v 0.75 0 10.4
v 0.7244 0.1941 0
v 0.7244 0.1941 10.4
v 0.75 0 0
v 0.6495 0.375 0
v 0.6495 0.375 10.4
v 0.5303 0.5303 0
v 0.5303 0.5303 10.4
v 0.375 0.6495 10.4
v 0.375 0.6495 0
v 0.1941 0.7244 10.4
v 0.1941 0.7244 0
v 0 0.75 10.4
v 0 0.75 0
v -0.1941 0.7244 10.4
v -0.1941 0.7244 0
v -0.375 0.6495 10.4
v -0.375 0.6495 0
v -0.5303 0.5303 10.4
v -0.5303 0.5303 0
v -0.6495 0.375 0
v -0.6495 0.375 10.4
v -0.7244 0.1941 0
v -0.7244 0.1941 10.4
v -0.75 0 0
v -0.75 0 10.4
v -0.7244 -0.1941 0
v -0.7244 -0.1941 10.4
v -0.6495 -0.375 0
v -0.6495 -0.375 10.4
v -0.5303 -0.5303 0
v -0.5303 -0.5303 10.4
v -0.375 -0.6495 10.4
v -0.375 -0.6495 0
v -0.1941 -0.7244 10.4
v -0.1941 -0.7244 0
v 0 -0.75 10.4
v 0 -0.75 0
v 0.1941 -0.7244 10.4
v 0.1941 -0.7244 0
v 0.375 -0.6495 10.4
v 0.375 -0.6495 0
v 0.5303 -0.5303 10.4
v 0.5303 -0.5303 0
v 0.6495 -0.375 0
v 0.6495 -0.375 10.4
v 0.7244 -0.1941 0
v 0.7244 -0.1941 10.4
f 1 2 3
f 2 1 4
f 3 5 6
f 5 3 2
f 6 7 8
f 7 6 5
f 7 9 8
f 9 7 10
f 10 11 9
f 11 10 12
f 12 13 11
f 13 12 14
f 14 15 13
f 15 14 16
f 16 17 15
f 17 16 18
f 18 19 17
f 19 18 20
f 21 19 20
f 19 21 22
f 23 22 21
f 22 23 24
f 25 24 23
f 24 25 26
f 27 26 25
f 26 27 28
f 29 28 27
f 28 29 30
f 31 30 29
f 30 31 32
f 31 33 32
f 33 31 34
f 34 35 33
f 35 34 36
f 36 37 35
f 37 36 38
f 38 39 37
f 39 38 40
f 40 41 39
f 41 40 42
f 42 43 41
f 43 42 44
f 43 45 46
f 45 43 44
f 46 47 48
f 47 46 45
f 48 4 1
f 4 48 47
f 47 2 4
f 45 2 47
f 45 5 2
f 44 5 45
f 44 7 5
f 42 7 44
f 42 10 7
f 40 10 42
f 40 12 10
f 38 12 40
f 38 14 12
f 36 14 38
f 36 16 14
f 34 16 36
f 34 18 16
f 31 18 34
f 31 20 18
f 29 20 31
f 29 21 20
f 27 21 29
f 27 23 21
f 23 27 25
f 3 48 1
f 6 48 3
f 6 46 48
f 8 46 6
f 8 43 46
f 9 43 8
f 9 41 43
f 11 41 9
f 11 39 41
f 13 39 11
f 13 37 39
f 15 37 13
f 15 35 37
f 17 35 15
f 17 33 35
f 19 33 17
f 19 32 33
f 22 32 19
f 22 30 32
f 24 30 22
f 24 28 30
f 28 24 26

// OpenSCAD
// part_id: mar14
// name: Mars pointer orb rod large
// source_drawing_ids: DRW-013
// units: mm
// revision: 0.1
// SPDX-License-Identifier: MIT

module part_mar14(d = 1.5, h = 10.4) {
    cylinder(d = d, h = h, center = false, $fn = 24);
}

// ---- "main guard" ----
if (is_undef(__LIB_MODE__)) {
    part_mar14();
}
